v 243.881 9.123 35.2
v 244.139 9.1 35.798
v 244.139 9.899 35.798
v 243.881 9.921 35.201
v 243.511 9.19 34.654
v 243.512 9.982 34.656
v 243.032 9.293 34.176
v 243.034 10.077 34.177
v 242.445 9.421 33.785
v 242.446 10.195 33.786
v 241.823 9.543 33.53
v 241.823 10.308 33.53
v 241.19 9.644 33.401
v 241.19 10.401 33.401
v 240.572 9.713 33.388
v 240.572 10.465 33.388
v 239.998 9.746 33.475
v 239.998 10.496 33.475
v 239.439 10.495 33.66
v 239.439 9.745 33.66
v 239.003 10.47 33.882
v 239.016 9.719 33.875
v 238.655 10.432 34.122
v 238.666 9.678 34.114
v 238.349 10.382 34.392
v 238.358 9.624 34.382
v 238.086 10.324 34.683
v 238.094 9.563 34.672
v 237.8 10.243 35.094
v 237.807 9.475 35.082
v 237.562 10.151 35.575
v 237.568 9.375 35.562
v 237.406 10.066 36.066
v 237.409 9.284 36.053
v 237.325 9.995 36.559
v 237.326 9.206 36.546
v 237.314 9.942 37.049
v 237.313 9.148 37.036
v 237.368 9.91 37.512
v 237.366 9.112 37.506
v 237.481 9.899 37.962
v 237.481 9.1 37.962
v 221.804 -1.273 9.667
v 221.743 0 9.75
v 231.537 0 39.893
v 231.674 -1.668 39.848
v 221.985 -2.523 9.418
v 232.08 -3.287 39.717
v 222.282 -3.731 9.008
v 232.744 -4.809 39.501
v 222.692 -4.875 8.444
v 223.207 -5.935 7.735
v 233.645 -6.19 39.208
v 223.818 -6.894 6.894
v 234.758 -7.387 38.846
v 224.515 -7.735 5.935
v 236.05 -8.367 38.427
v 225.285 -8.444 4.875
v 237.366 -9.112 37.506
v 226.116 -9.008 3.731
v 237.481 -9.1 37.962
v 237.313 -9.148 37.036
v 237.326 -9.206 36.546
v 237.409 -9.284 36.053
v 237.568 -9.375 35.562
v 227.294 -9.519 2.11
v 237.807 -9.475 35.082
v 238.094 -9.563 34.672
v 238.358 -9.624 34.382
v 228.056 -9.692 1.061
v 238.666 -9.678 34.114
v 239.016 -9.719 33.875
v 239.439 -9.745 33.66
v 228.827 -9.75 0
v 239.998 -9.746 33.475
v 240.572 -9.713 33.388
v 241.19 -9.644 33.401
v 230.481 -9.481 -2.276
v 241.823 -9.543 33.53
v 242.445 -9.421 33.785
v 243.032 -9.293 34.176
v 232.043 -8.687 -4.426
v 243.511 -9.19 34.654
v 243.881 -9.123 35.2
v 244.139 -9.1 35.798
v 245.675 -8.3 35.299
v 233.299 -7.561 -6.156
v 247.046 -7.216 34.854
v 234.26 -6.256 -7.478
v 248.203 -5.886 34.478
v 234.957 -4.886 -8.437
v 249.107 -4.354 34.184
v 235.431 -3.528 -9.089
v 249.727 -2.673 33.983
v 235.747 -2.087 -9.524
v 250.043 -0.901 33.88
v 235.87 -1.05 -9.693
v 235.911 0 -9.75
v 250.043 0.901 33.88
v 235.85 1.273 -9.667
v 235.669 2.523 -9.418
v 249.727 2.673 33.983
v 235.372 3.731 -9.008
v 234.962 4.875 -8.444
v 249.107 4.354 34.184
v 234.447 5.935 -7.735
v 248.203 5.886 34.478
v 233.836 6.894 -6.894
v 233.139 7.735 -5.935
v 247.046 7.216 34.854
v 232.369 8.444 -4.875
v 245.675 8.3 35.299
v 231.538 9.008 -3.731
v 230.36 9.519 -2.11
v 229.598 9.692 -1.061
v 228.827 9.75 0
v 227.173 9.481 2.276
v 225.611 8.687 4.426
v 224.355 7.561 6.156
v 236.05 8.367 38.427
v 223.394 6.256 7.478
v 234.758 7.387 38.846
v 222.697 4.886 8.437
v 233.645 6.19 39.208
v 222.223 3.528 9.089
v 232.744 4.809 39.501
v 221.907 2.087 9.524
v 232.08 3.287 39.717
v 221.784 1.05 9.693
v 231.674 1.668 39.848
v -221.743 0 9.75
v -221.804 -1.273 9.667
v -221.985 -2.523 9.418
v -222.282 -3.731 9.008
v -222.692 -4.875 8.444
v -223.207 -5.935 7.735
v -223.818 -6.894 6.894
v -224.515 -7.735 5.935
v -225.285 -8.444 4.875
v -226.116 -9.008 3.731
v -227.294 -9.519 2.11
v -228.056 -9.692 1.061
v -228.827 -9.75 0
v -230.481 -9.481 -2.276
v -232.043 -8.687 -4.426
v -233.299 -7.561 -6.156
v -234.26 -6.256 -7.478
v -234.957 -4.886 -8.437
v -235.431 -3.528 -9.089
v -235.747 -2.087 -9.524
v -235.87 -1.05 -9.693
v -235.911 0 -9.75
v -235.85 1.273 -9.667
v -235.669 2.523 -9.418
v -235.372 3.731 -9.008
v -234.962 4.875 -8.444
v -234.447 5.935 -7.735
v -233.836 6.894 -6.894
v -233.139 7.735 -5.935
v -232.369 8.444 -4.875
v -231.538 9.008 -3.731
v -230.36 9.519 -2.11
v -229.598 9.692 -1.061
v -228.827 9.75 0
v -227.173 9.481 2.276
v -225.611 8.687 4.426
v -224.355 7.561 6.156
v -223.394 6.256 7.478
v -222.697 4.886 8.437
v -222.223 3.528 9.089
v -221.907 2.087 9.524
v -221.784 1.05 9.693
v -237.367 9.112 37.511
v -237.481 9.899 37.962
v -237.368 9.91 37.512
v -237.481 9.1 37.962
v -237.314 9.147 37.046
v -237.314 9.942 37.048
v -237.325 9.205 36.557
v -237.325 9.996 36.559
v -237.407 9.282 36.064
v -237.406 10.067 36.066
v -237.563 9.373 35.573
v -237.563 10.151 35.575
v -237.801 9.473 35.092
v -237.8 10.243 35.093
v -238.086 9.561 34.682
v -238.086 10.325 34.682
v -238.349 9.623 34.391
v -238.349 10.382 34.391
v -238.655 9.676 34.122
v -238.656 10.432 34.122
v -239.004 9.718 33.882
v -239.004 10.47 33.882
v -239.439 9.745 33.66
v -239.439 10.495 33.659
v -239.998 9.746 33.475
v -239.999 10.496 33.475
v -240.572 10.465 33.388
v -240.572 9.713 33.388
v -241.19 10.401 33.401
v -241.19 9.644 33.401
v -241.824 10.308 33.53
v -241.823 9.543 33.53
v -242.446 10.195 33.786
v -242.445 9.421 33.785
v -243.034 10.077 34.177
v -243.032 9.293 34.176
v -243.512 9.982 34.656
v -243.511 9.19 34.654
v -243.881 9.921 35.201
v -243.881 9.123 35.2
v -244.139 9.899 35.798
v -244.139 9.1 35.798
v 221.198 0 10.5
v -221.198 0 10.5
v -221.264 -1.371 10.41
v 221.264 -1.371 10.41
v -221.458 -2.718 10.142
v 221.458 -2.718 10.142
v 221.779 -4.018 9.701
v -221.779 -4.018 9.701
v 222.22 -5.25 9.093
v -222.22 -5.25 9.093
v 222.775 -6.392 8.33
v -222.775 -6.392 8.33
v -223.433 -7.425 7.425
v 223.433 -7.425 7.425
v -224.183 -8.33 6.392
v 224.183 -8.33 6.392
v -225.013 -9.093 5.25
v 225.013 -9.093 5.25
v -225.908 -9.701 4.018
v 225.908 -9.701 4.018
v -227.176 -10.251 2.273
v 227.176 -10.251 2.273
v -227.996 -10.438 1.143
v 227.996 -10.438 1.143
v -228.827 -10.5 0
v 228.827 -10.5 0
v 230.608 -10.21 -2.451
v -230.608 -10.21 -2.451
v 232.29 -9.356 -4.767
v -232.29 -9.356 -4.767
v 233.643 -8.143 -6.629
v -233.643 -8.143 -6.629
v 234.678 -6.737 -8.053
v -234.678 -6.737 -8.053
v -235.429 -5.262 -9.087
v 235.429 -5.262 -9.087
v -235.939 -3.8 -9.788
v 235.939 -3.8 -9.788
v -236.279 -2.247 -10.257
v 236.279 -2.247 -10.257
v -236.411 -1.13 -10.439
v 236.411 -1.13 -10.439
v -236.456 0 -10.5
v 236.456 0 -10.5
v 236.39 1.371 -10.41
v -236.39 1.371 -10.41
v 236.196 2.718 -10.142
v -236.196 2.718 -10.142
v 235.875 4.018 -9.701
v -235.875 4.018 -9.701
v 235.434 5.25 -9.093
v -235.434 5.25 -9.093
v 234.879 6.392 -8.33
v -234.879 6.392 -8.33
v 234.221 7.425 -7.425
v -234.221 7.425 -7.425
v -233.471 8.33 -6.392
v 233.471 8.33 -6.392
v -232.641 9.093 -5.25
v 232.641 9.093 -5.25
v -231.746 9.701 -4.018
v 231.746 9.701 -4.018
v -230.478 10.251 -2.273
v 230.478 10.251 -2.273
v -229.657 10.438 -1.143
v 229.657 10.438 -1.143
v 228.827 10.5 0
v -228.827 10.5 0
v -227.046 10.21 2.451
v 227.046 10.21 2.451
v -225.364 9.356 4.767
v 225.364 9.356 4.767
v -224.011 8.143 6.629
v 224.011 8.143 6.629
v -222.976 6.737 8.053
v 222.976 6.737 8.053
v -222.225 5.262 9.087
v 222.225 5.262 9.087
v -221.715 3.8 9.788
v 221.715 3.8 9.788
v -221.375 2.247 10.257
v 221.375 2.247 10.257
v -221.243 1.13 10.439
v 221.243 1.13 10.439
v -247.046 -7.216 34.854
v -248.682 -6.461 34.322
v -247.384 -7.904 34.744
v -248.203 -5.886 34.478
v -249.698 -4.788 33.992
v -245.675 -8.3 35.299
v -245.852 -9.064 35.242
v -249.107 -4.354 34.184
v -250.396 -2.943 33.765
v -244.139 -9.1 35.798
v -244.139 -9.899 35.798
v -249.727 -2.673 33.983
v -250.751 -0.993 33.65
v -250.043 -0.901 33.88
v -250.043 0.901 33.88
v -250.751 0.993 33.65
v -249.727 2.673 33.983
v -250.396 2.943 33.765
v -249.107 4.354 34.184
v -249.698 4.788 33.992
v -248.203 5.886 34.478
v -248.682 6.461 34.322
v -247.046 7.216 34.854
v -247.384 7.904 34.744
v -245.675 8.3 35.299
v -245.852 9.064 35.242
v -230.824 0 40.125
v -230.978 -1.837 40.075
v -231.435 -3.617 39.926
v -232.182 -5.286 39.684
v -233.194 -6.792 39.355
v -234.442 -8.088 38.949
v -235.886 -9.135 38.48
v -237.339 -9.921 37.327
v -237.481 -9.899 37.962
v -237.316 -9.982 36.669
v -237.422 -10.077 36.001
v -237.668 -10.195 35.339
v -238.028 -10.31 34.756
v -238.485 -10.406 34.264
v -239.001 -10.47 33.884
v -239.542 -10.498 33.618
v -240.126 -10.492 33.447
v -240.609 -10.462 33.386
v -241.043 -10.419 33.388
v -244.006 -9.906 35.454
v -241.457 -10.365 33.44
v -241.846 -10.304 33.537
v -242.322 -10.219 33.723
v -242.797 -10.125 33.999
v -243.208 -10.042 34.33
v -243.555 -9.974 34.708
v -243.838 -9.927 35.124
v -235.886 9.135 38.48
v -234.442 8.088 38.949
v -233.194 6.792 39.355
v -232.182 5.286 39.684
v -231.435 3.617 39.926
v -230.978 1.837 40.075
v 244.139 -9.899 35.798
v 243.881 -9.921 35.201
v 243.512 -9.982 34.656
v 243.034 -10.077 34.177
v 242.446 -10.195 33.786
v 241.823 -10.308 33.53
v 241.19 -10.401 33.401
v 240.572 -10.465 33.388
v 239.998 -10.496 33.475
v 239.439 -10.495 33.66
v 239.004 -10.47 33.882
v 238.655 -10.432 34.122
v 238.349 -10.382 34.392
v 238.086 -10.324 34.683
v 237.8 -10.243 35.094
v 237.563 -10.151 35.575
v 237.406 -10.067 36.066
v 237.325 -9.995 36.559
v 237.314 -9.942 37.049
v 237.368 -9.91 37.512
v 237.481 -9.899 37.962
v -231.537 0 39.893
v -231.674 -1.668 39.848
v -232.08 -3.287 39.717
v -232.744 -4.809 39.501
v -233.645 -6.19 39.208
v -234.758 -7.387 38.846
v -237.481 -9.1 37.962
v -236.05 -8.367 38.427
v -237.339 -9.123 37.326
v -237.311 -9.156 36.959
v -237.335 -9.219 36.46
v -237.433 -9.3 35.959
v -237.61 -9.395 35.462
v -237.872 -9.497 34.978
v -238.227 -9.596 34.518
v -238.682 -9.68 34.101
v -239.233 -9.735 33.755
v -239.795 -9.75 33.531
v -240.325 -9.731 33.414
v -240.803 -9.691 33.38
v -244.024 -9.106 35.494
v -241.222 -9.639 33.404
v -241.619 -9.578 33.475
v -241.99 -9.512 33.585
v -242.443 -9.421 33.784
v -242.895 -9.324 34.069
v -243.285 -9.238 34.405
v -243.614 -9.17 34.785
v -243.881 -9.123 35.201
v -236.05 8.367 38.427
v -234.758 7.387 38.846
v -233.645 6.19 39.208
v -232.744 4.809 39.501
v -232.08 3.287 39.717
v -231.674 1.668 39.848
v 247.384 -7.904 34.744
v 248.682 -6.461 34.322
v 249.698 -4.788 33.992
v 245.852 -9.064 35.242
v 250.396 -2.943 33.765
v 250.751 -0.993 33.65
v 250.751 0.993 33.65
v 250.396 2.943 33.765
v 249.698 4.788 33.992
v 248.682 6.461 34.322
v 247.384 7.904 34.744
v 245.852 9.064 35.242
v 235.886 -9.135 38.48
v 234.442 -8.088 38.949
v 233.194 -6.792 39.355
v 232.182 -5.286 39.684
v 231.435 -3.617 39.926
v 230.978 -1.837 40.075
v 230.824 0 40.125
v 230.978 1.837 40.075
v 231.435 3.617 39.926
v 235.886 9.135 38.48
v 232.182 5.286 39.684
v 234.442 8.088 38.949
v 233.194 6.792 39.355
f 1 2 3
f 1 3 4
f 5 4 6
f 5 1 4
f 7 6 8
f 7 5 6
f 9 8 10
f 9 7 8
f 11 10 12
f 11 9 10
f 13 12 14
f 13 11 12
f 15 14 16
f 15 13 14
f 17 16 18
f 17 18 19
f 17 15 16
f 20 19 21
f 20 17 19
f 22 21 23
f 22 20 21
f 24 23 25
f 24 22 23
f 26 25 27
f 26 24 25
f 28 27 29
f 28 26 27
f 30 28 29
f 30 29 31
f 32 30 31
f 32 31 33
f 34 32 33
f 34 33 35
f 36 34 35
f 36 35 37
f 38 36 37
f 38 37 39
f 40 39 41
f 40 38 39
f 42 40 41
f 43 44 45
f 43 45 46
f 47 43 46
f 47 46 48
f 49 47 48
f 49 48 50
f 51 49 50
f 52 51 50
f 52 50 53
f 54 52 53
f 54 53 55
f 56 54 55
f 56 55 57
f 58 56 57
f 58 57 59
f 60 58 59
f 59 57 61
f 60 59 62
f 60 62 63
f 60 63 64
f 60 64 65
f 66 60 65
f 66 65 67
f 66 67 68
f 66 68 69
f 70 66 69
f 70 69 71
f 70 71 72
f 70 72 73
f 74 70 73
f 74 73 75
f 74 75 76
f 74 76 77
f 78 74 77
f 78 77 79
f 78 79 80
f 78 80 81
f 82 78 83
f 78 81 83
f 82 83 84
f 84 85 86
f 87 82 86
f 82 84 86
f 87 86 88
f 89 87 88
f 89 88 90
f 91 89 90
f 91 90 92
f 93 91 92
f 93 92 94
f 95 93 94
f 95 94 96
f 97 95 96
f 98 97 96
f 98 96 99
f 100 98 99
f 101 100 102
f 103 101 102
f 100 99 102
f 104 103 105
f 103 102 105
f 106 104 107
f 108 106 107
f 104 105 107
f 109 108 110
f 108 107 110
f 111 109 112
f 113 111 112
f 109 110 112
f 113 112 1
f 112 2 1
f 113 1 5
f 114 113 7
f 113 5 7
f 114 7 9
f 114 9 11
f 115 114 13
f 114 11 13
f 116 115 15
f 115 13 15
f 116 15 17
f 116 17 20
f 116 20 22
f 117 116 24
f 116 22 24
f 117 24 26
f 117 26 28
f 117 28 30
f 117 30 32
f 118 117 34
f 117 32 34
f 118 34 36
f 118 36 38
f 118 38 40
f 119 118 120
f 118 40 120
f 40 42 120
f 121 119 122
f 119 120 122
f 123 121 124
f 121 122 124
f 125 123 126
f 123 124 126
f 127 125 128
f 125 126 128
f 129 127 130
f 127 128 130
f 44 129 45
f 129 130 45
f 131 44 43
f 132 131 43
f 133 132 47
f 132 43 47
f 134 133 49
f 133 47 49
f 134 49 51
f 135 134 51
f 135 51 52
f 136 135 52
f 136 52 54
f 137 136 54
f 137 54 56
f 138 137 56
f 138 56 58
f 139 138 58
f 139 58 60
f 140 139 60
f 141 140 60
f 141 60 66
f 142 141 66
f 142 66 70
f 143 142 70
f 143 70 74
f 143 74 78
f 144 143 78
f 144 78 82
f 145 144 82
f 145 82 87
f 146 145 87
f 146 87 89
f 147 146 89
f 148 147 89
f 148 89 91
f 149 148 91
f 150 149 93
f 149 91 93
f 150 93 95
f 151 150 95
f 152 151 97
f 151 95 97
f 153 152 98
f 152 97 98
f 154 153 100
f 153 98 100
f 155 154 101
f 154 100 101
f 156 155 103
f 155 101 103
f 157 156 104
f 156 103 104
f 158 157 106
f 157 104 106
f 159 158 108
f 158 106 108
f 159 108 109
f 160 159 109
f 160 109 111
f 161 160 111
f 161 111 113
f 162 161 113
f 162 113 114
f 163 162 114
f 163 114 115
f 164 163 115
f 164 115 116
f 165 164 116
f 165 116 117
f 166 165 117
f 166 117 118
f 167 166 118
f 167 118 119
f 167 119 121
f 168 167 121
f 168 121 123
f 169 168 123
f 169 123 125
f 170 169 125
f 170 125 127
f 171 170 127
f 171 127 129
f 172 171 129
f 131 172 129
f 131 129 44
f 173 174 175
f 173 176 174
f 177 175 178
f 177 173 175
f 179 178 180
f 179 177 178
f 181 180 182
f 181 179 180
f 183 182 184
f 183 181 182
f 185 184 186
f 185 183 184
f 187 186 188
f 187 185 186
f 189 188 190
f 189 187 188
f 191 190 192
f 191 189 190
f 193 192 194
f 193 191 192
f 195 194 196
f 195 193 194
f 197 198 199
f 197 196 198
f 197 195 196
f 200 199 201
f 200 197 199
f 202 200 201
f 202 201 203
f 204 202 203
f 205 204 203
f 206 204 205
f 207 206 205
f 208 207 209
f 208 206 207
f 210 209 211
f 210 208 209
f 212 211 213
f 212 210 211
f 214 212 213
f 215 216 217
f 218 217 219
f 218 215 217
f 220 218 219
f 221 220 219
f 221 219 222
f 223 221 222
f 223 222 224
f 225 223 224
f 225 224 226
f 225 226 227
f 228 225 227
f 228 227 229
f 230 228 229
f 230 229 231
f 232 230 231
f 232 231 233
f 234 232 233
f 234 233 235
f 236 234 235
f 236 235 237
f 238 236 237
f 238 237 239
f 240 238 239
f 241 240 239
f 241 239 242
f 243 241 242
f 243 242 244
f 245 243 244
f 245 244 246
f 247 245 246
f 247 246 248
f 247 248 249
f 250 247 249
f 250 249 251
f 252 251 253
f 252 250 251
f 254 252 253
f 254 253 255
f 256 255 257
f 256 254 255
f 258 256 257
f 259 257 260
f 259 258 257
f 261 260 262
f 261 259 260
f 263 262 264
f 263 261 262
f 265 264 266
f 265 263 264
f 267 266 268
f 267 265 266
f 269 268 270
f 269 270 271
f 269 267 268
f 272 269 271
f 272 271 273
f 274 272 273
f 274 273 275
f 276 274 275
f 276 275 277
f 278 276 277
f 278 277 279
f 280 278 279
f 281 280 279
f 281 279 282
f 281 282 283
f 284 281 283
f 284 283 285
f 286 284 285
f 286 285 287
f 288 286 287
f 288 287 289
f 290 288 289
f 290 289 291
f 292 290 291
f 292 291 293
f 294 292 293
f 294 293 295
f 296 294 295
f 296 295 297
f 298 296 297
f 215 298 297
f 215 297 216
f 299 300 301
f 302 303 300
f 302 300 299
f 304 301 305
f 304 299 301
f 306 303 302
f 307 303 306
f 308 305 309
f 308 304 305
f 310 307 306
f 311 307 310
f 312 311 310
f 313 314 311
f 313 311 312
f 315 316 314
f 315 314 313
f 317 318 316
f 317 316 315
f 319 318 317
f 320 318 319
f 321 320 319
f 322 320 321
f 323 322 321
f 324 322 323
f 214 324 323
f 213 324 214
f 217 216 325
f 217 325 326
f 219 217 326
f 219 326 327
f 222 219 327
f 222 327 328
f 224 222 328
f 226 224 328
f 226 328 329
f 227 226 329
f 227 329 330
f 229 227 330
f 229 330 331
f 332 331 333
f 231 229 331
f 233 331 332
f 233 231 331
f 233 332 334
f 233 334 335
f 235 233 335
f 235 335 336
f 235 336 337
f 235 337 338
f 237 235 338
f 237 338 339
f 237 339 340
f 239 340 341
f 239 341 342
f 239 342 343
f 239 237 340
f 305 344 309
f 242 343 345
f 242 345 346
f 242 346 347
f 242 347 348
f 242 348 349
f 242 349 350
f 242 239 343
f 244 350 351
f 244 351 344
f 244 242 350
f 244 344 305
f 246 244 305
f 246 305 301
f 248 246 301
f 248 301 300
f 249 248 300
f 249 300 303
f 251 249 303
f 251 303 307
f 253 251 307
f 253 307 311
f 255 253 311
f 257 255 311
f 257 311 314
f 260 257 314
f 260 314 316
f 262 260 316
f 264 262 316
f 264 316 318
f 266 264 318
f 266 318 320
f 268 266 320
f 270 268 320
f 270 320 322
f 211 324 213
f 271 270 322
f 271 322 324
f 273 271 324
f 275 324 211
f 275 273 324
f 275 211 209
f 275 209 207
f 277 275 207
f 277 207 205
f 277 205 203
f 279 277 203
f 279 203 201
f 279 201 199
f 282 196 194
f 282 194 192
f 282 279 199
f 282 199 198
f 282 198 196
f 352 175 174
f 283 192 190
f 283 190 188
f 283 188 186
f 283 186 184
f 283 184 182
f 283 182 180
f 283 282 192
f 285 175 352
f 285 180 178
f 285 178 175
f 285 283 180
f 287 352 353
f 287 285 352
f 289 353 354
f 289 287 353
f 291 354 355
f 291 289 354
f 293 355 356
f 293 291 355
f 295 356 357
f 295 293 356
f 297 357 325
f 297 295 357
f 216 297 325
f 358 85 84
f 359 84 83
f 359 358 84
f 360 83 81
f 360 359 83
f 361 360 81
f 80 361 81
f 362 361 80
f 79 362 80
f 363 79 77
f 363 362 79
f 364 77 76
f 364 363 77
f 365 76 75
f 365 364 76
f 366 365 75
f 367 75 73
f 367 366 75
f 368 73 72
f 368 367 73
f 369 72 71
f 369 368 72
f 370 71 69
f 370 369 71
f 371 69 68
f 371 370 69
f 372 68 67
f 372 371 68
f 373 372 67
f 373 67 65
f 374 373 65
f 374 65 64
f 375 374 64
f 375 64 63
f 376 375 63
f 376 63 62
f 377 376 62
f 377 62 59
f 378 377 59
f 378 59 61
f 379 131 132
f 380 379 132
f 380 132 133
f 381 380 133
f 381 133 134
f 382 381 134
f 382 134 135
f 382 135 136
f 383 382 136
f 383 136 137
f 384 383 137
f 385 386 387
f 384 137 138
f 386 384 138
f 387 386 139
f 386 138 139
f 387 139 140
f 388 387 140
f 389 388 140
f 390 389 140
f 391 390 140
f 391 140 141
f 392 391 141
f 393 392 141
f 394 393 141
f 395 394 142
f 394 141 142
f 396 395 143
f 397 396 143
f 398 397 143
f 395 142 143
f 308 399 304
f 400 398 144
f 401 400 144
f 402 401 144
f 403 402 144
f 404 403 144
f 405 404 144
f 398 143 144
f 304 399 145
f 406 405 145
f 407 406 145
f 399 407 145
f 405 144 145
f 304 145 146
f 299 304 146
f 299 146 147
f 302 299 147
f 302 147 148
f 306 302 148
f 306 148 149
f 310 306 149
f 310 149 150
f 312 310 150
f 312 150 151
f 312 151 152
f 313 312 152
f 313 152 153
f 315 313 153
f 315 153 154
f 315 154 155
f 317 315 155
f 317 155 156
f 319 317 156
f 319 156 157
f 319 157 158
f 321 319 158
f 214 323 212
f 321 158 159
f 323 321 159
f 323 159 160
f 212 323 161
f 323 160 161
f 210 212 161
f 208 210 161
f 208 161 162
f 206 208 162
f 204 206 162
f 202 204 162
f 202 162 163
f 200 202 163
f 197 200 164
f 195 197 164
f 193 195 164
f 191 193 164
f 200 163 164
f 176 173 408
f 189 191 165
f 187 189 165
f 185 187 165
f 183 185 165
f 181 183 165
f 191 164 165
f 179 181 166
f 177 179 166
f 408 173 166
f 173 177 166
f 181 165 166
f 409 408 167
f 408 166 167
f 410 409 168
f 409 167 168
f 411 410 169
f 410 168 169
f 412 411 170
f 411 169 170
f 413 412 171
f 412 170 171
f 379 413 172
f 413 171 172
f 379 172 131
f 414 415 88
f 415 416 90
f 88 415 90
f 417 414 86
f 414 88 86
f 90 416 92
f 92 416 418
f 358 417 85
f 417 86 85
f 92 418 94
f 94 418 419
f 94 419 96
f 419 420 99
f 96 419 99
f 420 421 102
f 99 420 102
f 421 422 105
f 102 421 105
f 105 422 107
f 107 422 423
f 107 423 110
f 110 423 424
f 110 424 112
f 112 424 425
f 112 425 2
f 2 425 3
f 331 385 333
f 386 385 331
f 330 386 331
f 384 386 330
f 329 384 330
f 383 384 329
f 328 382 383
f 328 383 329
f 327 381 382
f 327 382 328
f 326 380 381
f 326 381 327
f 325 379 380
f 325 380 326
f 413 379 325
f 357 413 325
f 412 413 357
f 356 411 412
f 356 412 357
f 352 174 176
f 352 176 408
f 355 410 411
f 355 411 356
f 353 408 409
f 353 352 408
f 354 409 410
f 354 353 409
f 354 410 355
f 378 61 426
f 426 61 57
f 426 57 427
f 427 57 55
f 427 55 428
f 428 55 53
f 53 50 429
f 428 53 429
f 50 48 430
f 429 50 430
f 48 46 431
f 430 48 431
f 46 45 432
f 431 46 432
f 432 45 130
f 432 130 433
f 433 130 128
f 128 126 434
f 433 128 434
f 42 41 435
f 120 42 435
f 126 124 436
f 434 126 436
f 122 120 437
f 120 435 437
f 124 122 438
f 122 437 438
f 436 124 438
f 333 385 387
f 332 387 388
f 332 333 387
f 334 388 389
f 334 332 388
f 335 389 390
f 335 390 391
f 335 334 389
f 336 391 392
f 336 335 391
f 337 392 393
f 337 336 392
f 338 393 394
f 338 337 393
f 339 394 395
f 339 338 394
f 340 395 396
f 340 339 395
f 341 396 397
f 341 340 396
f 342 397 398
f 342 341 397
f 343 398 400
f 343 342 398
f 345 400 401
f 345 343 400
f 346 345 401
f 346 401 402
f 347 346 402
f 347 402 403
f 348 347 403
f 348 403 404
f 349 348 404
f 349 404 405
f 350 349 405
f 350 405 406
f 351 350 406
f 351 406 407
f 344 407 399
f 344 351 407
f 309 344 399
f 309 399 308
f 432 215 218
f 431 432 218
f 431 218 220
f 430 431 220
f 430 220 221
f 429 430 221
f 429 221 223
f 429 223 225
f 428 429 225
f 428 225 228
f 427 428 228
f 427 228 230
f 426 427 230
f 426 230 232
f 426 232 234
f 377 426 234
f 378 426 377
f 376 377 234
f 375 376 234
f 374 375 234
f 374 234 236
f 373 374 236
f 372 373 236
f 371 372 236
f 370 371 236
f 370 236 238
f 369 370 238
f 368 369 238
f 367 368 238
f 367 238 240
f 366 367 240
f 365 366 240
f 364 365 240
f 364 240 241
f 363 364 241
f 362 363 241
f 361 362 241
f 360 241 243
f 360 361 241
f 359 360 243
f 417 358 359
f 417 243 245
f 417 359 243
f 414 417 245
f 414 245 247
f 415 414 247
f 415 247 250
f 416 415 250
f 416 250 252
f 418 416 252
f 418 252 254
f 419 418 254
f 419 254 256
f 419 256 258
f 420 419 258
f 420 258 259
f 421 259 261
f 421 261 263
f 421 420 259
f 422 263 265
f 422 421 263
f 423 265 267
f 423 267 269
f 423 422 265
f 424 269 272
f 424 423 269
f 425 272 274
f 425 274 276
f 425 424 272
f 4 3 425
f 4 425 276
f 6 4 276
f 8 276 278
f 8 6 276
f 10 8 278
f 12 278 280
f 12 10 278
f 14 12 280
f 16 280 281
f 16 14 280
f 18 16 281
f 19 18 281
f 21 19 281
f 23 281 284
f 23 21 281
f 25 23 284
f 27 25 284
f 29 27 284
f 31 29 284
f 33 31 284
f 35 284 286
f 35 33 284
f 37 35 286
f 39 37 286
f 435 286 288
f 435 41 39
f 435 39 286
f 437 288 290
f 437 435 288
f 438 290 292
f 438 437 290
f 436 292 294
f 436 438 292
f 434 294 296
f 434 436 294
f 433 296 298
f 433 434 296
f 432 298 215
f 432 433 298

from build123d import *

# Parameters (mm, degrees)
SKETCH2_R               = 10.5
SKETCH2_R_2             = 9.75
CUT_EXTRUDE1_DEPTH      = 255.202518271
CUT_EXTRUDE1_DEPTH_BACK = 255.202518271
SKETCH3_R               = 3.5


with BuildPart() as part:
    # Sweep1: sweep along a path in Sketch1
    with BuildLine(Plane(origin=(0, 0, 0), x_dir=(1, 0, 0), z_dir=(0, 1, 0))) as sweep1_path:
        Line((-240.81, -36.88), (-228.826961603, 0))
        Line((-228.826961603, 0), (228.826961603, 0))
        Line((228.826961603, 0), (240.81, -36.88))
    # Sketch2 → Sweep1 (sweep)
    with BuildSketch(Plane(origin=(-240.81, 0, 36.88), x_dir=(0.9510565162951523, 0, 0.3090169943749515), z_dir=(-0.3090169943749515, 0, 0.9510565162951523))):
        Circle(SKETCH2_R)
        Circle(SKETCH2_R_2, mode=Mode.SUBTRACT)
    sweep(path=sweep1_path.line, transition=Transition.RIGHT)

    # Sketch3 → Cut-Extrude1 (cut, two sides: drawn at the far end of the back side and taken through both)
    with BuildSketch(Plane(origin=(0, 0, 0), x_dir=(1, 0, 0), z_dir=(0, 1, 0)).offset(-CUT_EXTRUDE1_DEPTH_BACK)):
        with Locations((240.81, -36.88)):
            Circle(SKETCH3_R)
        with Locations((-240.81, -36.88)):
            Circle(SKETCH3_R)
    extrude(amount=CUT_EXTRUDE1_DEPTH + CUT_EXTRUDE1_DEPTH_BACK, mode=Mode.SUBTRACT)


solid = part.part
